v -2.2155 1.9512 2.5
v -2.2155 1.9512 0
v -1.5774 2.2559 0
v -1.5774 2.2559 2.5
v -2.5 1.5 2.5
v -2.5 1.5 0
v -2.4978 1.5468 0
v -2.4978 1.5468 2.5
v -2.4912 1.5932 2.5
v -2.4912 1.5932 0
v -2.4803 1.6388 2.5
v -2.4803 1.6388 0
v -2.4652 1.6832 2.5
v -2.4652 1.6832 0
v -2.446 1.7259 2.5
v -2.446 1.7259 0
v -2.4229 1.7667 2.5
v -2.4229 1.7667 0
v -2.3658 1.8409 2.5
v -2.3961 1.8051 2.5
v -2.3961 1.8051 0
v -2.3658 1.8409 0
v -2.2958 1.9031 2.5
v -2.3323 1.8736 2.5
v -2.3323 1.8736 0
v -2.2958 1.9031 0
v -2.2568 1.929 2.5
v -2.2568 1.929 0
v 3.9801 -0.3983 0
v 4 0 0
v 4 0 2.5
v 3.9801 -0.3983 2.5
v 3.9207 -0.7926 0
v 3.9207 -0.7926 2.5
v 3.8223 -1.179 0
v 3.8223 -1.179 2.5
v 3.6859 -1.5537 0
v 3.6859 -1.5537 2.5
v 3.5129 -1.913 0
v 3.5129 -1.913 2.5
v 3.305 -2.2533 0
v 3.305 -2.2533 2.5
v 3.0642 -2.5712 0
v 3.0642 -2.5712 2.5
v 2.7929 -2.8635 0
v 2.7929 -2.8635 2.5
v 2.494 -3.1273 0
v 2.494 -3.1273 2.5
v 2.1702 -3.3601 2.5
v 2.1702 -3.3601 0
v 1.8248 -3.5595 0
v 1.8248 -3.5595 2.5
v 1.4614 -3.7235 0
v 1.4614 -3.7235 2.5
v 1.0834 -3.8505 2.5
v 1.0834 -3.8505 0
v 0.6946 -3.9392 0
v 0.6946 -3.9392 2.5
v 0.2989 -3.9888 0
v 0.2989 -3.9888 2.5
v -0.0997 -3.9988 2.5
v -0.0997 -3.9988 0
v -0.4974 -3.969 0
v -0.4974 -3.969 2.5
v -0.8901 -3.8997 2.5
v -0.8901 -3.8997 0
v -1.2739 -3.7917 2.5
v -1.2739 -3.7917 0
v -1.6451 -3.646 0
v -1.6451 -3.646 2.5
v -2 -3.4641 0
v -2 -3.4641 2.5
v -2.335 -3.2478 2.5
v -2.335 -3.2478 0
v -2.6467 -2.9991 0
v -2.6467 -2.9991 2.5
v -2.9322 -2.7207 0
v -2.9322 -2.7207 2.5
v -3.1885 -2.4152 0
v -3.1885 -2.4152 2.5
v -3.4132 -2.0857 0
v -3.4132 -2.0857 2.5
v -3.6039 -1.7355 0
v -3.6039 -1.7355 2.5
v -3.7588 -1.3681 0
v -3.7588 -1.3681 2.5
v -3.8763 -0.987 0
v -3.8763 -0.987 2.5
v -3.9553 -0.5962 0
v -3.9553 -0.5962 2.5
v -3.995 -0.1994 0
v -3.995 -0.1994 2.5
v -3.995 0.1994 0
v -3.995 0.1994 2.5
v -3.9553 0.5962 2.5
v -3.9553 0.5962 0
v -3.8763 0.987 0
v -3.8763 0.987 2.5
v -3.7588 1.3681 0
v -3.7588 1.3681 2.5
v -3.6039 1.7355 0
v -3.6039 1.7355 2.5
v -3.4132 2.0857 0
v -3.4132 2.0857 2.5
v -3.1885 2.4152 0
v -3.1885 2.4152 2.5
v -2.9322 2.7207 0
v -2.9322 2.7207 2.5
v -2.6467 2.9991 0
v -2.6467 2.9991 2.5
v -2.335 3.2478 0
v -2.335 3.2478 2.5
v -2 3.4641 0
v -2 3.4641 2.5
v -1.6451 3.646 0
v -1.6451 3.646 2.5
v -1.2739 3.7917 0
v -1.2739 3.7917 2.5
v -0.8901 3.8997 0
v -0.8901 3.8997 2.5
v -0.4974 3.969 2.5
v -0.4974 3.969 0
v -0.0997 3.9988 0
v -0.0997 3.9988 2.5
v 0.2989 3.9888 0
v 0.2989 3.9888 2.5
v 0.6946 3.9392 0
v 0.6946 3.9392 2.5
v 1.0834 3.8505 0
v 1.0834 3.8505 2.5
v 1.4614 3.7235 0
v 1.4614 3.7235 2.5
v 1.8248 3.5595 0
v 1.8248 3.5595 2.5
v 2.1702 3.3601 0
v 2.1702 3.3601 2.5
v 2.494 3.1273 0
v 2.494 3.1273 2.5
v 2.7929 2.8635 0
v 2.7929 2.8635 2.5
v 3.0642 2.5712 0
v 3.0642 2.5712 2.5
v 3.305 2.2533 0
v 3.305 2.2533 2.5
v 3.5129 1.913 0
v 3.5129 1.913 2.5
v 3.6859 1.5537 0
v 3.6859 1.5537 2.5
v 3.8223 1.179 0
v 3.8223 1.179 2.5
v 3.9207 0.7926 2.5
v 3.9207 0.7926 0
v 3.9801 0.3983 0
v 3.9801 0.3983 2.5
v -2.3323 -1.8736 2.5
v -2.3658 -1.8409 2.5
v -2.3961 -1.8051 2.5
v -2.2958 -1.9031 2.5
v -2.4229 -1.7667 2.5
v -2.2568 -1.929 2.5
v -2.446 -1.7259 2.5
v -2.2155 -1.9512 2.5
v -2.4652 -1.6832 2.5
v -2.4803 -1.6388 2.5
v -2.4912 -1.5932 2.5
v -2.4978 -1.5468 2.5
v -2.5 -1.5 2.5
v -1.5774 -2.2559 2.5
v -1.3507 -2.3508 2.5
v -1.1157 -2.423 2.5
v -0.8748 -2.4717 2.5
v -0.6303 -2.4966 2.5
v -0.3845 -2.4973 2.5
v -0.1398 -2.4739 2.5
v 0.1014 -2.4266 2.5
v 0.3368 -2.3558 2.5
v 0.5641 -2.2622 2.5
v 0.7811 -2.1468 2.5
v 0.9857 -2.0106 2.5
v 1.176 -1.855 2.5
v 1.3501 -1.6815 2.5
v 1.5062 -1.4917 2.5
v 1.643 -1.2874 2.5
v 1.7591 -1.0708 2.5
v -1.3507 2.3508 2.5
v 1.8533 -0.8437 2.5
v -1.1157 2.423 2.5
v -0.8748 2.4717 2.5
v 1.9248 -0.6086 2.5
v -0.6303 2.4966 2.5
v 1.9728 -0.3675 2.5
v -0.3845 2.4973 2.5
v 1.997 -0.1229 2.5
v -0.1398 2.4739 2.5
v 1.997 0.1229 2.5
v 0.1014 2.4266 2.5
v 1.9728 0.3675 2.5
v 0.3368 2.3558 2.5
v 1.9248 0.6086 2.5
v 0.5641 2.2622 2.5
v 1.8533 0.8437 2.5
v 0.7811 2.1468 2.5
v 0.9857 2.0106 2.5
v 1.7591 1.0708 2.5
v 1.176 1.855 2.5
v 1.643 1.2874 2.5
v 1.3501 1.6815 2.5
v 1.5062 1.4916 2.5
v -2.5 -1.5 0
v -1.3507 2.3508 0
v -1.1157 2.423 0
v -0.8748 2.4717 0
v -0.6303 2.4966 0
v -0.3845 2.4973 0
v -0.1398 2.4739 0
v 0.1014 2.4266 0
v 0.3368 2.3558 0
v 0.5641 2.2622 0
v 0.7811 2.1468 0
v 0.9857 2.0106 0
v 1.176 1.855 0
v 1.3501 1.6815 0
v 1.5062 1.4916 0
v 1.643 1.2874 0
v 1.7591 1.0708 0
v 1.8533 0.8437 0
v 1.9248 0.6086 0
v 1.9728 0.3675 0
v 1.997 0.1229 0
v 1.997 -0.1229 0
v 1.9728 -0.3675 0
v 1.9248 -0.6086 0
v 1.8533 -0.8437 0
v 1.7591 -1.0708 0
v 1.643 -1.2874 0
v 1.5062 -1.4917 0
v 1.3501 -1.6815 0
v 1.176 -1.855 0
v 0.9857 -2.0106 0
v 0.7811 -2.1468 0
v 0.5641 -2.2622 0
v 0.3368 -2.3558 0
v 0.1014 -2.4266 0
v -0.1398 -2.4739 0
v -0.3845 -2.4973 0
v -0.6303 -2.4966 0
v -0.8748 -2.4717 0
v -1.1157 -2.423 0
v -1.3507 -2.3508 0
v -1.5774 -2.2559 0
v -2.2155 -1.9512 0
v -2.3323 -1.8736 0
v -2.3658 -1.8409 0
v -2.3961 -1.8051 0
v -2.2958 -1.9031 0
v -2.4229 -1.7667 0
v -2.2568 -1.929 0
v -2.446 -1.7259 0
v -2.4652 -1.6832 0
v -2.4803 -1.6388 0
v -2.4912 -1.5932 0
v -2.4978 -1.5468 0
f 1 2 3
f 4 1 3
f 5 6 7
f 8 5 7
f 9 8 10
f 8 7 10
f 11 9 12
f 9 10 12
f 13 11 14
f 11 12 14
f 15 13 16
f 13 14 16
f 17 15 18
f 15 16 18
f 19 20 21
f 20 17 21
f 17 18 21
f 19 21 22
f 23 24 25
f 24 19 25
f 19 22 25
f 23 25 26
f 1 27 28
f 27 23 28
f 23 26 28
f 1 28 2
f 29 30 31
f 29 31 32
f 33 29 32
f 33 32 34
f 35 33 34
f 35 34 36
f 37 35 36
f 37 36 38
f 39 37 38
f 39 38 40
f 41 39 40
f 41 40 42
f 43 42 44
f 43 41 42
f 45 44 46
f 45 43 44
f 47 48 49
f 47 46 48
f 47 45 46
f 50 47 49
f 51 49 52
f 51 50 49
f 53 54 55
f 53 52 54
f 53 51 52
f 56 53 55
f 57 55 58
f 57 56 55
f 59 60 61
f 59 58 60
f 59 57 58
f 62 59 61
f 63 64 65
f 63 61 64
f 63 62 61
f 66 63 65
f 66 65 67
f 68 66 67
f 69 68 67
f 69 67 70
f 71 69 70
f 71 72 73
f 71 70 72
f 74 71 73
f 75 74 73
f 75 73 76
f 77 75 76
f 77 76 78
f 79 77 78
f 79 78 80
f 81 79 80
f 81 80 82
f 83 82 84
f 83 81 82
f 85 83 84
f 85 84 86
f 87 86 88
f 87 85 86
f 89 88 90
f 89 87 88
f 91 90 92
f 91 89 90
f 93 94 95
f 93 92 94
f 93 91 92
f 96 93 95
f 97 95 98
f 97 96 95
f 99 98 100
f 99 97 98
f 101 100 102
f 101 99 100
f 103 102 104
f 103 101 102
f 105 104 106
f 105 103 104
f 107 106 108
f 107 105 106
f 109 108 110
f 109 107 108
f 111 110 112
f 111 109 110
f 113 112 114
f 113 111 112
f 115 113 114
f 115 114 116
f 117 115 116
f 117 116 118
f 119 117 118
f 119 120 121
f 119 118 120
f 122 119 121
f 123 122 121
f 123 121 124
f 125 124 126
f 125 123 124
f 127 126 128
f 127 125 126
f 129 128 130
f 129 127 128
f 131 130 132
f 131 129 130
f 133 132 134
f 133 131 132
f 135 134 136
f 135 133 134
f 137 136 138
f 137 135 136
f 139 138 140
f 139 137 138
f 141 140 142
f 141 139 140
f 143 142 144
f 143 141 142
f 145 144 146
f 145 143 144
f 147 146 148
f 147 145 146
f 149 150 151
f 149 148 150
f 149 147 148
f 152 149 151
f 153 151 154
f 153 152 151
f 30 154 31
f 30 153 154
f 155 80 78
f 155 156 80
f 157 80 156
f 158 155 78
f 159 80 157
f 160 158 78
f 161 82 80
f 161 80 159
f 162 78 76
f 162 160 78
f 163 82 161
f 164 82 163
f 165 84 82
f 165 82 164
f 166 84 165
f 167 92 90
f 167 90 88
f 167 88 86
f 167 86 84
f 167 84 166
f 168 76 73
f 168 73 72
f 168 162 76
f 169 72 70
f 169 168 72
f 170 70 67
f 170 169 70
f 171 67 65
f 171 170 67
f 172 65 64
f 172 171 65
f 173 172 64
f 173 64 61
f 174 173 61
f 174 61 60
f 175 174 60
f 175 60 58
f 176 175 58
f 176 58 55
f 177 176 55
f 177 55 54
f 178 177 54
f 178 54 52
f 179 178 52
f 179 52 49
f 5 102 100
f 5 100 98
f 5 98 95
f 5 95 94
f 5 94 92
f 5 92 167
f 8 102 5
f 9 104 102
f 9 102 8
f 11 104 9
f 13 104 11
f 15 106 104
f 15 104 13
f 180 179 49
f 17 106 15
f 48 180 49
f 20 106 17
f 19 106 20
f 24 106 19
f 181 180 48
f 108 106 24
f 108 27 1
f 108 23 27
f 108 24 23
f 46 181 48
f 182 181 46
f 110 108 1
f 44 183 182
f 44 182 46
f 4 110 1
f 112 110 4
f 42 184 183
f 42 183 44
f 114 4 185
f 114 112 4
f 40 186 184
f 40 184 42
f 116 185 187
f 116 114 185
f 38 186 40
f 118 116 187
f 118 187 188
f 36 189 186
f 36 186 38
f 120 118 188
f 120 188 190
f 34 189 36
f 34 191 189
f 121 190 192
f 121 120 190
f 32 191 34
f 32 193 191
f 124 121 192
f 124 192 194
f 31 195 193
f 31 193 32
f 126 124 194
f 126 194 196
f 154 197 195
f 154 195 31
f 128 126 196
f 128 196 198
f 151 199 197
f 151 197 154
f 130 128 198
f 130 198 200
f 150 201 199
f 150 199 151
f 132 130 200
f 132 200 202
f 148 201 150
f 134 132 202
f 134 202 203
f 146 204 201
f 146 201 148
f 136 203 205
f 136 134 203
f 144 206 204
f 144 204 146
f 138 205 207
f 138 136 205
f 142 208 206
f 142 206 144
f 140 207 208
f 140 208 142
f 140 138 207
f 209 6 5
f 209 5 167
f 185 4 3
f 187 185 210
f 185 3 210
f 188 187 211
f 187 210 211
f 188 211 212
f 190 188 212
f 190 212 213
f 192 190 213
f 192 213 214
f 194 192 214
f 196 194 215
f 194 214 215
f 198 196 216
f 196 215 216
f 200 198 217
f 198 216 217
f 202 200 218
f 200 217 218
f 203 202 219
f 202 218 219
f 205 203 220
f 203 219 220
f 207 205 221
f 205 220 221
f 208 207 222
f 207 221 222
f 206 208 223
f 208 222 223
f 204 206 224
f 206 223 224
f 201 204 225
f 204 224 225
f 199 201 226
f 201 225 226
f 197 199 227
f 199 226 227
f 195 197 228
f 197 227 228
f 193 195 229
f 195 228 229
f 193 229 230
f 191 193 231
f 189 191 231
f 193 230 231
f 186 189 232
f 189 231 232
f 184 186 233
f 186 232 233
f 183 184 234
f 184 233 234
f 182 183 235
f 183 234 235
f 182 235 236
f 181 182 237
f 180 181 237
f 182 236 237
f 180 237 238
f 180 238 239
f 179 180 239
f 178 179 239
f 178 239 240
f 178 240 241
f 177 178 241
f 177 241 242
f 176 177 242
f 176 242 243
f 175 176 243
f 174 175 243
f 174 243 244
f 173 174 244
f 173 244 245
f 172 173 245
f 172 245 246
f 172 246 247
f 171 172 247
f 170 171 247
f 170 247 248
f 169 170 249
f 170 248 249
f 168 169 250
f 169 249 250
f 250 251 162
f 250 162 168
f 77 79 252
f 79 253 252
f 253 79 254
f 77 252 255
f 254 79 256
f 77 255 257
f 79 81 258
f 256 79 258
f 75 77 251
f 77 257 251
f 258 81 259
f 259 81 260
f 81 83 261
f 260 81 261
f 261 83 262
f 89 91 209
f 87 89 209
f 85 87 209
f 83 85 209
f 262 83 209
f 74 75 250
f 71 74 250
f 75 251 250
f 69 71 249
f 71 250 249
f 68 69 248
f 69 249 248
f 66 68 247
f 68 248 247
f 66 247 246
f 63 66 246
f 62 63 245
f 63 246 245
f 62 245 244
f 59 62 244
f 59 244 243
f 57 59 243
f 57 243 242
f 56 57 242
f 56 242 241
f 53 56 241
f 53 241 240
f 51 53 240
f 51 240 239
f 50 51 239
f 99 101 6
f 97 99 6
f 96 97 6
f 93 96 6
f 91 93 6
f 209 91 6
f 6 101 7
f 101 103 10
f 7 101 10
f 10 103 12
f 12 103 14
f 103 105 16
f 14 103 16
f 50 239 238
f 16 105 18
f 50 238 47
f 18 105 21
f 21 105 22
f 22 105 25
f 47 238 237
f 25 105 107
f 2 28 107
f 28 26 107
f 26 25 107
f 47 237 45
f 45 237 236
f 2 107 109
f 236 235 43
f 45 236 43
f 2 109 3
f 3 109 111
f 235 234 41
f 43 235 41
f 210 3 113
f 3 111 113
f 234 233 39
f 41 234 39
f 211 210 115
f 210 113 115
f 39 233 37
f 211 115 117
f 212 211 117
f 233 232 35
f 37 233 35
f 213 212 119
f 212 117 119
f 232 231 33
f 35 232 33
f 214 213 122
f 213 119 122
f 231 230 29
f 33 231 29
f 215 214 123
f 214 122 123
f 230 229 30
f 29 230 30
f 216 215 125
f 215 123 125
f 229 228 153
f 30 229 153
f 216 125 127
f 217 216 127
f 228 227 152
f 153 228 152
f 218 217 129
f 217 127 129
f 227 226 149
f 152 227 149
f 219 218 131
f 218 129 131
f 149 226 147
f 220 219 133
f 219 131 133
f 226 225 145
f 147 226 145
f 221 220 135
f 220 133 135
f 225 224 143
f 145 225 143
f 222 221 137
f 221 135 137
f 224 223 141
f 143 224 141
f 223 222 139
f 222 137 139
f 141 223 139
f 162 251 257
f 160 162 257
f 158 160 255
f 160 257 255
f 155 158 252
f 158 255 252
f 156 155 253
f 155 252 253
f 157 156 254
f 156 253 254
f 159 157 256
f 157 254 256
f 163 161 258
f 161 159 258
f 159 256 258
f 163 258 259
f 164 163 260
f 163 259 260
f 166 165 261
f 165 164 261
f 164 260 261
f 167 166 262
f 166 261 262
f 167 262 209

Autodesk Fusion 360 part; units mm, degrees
sketch "Sketch1" plane through (0, 0, 0) normal (0, 0, 1) x (1, 0, 0)
  circle A0 centre (0, 0) radius 4
  circle A1 centre (-0.5, 0) radius 2.5
  line L0 (-2.5, 1.5) -> (-2.5, -1.5)
  circle A2 centre (-2, 1.5) radius 0.5
  line L1 (-2.8087, 1.6679) -> (-0.6979, 2.676)
  line L2 (-0.5, 0) -> (0, 0)
  line L3 (-2.8087, -1.6679) -> (-0.6979, -2.676)
  circle A3 centre (-2, -1.5) radius 0.5
  dimension "d1" = 8
  dimension "d2" = 5
  dimension "d3" = 0.5
  dimension "d4" = 2
  dimension "d13" = 1
extrude "Extrude3" add sketch "Sketch1" along normal blind 2.5 contours A0 | A1 L0
